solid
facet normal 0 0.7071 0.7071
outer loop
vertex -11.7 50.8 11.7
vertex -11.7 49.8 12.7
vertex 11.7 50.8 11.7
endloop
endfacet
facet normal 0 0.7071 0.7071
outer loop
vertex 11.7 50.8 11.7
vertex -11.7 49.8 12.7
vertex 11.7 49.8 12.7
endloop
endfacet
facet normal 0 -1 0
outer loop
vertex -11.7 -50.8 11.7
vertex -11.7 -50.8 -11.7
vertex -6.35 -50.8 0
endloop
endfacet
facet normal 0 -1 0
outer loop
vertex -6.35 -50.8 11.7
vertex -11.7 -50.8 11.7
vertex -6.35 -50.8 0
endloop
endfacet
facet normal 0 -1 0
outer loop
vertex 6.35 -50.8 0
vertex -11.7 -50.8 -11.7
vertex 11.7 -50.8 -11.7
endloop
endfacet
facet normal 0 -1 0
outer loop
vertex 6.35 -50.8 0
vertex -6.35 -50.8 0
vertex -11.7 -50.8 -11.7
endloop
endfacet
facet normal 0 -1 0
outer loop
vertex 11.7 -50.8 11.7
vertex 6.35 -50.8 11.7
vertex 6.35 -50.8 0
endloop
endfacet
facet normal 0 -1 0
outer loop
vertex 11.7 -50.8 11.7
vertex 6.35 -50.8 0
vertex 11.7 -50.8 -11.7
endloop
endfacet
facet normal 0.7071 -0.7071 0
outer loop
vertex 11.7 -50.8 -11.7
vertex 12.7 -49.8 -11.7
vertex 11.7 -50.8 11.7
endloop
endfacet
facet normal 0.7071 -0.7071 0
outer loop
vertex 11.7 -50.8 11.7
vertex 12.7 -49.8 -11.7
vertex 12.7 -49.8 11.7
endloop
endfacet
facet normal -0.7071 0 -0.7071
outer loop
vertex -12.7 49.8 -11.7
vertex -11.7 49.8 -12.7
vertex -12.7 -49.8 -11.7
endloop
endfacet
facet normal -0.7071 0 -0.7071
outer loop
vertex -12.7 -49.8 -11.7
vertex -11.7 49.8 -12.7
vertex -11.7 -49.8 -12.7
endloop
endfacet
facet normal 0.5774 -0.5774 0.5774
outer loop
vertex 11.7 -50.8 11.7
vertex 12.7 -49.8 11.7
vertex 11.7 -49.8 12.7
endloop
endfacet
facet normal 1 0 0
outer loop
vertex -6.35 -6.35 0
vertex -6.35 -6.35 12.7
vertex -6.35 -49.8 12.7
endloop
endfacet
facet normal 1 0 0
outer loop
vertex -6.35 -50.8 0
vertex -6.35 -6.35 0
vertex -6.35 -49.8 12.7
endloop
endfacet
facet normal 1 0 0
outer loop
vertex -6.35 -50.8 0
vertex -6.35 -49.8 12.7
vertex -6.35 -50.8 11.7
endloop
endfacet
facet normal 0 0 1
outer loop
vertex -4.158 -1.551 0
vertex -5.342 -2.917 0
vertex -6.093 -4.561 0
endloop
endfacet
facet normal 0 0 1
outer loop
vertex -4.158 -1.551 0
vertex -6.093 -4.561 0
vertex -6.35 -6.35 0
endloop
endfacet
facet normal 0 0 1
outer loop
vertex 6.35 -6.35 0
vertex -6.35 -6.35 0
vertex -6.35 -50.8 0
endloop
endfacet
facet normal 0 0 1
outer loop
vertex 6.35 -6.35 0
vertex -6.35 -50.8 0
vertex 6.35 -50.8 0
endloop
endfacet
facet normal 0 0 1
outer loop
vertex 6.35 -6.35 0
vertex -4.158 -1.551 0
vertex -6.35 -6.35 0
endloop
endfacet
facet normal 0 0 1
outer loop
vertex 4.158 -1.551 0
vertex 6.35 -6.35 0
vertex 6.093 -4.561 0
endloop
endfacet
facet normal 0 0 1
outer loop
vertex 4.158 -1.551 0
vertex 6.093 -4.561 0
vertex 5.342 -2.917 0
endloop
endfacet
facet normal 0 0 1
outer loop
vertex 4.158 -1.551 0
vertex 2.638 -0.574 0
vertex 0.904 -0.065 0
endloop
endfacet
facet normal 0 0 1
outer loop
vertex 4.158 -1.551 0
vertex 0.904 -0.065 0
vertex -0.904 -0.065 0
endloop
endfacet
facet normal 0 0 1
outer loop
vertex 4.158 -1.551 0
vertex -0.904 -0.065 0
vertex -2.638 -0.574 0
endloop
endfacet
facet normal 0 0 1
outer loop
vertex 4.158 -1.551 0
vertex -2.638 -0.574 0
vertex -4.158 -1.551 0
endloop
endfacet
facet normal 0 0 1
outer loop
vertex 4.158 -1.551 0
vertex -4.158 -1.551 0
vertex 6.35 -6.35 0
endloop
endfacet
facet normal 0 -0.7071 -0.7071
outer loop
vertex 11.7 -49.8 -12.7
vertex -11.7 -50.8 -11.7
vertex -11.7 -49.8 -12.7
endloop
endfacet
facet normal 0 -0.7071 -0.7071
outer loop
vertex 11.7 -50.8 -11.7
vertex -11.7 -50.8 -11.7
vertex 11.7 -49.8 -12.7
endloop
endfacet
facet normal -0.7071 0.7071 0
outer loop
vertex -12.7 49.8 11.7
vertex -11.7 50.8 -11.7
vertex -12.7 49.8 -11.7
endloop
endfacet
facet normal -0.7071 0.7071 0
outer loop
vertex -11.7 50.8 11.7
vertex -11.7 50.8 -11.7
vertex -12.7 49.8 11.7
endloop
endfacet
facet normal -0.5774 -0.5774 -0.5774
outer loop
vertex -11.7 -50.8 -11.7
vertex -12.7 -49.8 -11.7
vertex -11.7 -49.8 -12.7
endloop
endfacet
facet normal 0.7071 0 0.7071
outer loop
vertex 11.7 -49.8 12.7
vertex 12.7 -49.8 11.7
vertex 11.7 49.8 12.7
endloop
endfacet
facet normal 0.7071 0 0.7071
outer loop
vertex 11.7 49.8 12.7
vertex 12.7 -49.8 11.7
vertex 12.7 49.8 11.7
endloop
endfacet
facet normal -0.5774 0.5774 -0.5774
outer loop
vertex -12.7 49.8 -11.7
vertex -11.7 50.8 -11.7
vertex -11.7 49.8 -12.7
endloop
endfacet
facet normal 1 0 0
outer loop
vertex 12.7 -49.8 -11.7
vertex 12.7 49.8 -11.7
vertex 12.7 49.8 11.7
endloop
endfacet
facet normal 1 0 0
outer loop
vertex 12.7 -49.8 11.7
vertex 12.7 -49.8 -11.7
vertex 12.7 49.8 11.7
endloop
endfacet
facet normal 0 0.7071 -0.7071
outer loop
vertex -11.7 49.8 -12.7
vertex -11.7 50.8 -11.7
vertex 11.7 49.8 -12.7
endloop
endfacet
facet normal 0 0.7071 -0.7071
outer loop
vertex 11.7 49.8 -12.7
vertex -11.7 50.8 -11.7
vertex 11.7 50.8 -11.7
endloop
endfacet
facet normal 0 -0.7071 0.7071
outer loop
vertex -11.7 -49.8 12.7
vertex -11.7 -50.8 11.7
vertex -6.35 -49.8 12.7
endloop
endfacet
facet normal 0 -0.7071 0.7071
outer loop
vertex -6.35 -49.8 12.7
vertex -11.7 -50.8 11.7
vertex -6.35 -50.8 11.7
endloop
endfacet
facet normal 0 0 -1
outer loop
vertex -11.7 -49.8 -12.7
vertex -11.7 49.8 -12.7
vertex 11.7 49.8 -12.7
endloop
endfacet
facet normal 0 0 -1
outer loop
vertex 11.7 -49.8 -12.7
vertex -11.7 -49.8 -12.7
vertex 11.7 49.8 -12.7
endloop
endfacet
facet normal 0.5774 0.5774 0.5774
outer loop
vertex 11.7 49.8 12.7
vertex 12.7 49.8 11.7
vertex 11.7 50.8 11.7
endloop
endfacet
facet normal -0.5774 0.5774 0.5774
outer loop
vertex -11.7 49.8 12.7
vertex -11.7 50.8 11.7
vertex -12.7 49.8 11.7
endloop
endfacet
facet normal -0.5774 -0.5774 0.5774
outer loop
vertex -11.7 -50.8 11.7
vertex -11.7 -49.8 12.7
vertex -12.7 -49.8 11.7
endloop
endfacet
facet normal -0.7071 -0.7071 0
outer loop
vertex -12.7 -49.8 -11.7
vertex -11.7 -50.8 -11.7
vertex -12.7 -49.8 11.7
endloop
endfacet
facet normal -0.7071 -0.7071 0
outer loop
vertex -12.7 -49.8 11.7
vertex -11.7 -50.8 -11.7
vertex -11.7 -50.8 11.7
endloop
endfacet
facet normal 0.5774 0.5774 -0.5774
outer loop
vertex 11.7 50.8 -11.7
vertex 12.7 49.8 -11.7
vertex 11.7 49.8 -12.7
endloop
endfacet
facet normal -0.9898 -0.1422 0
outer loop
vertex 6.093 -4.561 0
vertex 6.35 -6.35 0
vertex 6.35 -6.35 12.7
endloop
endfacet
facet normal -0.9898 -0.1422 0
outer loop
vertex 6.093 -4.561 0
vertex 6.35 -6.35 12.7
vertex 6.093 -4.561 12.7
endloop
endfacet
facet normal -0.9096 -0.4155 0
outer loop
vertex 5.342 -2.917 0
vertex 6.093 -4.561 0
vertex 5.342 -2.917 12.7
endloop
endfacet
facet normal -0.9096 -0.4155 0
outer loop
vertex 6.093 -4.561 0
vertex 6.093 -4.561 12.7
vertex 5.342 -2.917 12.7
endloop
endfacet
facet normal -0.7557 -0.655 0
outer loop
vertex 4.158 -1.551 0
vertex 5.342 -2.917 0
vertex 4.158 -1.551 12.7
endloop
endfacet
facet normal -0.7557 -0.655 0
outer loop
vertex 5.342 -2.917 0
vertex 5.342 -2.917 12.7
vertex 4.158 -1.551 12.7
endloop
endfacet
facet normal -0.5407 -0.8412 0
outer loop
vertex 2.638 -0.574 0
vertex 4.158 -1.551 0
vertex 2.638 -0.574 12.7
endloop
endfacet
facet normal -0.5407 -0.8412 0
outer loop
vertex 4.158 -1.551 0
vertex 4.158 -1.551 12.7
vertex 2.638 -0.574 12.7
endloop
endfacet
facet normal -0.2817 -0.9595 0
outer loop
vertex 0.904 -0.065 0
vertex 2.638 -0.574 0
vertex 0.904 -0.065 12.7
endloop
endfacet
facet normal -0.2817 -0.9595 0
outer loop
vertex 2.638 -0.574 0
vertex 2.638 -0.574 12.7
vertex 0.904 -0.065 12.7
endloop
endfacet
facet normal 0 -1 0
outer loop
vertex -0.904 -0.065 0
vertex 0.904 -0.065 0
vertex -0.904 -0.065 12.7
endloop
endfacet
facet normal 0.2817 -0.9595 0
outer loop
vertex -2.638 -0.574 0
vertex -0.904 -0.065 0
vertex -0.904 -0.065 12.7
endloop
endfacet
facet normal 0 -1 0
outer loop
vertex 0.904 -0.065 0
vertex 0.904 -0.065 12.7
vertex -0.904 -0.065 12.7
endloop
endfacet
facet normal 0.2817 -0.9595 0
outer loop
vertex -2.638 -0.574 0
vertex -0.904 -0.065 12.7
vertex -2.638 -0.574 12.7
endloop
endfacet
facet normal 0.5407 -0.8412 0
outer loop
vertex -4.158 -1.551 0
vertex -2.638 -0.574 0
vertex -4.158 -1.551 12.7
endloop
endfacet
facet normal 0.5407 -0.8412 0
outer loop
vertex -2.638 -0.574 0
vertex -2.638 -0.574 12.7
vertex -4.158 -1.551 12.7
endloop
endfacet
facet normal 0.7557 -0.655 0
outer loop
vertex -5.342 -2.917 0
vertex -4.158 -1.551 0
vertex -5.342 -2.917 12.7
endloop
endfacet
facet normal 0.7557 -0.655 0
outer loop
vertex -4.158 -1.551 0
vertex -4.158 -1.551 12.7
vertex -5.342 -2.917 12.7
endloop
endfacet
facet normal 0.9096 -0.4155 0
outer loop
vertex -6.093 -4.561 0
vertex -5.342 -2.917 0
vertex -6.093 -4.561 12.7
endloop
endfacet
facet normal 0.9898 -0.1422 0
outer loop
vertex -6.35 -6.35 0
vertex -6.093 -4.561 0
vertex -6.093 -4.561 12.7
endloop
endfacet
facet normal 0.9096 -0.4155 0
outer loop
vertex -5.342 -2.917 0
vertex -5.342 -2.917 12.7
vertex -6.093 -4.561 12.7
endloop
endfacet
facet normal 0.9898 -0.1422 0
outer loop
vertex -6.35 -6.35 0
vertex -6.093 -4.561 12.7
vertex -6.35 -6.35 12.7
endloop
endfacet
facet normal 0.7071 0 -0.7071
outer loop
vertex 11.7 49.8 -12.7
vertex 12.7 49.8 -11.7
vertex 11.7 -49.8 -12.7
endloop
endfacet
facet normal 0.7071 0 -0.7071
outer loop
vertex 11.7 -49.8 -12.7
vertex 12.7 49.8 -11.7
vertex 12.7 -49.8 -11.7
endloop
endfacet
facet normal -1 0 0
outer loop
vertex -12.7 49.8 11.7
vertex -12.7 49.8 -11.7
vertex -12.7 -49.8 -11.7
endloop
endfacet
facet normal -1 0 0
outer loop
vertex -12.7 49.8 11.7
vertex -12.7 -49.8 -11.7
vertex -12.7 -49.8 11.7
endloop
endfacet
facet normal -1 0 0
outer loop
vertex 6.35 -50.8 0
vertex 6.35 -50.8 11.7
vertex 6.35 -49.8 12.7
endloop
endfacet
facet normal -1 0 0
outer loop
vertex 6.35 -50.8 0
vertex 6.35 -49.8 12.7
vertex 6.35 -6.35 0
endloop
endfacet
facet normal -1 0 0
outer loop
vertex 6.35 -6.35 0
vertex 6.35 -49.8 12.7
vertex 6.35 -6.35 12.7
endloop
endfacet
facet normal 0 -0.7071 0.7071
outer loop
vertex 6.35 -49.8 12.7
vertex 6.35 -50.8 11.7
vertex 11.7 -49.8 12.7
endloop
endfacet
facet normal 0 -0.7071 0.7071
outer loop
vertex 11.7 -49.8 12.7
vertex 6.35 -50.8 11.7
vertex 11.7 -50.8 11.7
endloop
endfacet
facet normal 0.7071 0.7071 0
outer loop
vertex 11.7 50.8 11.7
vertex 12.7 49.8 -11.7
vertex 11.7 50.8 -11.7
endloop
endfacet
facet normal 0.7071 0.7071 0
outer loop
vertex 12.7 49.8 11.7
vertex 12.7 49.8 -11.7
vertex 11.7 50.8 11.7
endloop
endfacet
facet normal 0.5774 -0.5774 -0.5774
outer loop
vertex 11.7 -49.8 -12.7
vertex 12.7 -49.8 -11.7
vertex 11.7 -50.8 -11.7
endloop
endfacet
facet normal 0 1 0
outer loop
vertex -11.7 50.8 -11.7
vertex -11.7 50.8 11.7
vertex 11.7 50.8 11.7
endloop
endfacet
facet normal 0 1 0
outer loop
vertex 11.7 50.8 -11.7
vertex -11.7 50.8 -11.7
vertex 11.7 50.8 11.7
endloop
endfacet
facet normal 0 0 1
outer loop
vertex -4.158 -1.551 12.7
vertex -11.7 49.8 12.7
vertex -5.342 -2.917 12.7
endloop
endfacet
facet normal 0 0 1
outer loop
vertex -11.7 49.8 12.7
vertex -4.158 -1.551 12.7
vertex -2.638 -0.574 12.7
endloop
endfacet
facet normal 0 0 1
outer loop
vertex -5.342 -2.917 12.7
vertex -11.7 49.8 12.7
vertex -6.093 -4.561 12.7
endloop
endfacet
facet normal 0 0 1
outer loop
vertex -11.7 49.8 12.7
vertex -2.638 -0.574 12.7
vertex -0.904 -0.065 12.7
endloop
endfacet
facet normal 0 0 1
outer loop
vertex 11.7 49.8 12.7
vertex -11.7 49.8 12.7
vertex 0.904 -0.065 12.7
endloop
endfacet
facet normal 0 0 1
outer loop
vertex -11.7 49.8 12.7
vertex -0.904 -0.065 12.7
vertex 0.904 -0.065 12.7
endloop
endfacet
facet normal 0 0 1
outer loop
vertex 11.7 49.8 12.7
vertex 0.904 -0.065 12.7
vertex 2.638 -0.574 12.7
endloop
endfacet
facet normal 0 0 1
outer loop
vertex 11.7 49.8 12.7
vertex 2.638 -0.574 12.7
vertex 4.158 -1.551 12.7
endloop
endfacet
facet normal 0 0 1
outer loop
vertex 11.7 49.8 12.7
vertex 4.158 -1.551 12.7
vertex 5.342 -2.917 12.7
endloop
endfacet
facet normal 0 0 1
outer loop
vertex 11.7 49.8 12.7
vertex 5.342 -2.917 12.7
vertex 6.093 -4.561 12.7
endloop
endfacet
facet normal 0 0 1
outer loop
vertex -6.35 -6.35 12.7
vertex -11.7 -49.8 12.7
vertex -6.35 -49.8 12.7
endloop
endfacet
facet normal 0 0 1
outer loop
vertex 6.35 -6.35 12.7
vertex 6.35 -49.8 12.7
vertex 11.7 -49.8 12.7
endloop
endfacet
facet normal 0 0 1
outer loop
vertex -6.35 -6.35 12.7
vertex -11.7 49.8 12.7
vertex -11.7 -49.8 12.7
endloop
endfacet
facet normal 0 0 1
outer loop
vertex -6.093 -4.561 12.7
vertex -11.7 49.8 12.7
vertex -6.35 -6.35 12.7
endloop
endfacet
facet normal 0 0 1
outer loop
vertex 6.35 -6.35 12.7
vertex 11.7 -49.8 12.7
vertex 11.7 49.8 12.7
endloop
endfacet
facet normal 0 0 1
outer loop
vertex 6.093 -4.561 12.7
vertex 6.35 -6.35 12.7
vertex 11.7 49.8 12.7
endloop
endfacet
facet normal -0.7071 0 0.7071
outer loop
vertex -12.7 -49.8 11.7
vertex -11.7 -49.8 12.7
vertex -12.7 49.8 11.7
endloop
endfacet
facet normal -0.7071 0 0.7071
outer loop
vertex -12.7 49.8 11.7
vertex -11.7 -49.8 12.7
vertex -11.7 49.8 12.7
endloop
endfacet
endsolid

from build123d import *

# Parameters (mm, degrees)
F0_W     = 25.4
F0_H     = 25.4
F1_DEPTH = 50.8
F3_DEPTH = 12.7
F4_SIZE  = 1


with BuildPart() as f1:
    # F0 (on Front) → F1 (new body, symmetric)
    with BuildSketch(Plane.XZ):
        Rectangle(F0_W, F0_H)
    extrude(amount=F1_DEPTH, both=True)

    # F2 (on face) → F3 (cut)
    with BuildSketch(Plane.XY.offset(12.7)):
        with BuildLine():
            Line((-6.35, -6.35), (-6.35, -50.8))
            Line((-6.35, -50.8), (6.35, -50.8))
            Line((6.35, -50.8), (6.35, -6.35))
            ThreePointArc((6.35, -6.35), (0, 0), (-6.35, -6.35))
        make_face()
    extrude(amount=-F3_DEPTH, mode=Mode.SUBTRACT)

    # F4
    f4_edges = [f1.edges().sort_by_distance(p)[0] for p in [
        (12.7, 0, 12.7),
        (12.7, -50.8, 0),
        (12.7, 0, -12.7),
        (12.7, 50.8, 0),
        (0, 50.8, -12.7),
        (0, 50.8, 12.7),
        (-12.7, 50.8, 0),
        (-12.7, 0, 12.7),
        (-9.525, -50.8, 12.7),
        (9.525, -50.8, 12.7),
        (-12.7, 0, -12.7),
        (-12.7, -50.8, 0),
        (0, -50.8, -12.7),
    ]]
    chamfer(f4_edges, length=F4_SIZE)


solid = f1.part
